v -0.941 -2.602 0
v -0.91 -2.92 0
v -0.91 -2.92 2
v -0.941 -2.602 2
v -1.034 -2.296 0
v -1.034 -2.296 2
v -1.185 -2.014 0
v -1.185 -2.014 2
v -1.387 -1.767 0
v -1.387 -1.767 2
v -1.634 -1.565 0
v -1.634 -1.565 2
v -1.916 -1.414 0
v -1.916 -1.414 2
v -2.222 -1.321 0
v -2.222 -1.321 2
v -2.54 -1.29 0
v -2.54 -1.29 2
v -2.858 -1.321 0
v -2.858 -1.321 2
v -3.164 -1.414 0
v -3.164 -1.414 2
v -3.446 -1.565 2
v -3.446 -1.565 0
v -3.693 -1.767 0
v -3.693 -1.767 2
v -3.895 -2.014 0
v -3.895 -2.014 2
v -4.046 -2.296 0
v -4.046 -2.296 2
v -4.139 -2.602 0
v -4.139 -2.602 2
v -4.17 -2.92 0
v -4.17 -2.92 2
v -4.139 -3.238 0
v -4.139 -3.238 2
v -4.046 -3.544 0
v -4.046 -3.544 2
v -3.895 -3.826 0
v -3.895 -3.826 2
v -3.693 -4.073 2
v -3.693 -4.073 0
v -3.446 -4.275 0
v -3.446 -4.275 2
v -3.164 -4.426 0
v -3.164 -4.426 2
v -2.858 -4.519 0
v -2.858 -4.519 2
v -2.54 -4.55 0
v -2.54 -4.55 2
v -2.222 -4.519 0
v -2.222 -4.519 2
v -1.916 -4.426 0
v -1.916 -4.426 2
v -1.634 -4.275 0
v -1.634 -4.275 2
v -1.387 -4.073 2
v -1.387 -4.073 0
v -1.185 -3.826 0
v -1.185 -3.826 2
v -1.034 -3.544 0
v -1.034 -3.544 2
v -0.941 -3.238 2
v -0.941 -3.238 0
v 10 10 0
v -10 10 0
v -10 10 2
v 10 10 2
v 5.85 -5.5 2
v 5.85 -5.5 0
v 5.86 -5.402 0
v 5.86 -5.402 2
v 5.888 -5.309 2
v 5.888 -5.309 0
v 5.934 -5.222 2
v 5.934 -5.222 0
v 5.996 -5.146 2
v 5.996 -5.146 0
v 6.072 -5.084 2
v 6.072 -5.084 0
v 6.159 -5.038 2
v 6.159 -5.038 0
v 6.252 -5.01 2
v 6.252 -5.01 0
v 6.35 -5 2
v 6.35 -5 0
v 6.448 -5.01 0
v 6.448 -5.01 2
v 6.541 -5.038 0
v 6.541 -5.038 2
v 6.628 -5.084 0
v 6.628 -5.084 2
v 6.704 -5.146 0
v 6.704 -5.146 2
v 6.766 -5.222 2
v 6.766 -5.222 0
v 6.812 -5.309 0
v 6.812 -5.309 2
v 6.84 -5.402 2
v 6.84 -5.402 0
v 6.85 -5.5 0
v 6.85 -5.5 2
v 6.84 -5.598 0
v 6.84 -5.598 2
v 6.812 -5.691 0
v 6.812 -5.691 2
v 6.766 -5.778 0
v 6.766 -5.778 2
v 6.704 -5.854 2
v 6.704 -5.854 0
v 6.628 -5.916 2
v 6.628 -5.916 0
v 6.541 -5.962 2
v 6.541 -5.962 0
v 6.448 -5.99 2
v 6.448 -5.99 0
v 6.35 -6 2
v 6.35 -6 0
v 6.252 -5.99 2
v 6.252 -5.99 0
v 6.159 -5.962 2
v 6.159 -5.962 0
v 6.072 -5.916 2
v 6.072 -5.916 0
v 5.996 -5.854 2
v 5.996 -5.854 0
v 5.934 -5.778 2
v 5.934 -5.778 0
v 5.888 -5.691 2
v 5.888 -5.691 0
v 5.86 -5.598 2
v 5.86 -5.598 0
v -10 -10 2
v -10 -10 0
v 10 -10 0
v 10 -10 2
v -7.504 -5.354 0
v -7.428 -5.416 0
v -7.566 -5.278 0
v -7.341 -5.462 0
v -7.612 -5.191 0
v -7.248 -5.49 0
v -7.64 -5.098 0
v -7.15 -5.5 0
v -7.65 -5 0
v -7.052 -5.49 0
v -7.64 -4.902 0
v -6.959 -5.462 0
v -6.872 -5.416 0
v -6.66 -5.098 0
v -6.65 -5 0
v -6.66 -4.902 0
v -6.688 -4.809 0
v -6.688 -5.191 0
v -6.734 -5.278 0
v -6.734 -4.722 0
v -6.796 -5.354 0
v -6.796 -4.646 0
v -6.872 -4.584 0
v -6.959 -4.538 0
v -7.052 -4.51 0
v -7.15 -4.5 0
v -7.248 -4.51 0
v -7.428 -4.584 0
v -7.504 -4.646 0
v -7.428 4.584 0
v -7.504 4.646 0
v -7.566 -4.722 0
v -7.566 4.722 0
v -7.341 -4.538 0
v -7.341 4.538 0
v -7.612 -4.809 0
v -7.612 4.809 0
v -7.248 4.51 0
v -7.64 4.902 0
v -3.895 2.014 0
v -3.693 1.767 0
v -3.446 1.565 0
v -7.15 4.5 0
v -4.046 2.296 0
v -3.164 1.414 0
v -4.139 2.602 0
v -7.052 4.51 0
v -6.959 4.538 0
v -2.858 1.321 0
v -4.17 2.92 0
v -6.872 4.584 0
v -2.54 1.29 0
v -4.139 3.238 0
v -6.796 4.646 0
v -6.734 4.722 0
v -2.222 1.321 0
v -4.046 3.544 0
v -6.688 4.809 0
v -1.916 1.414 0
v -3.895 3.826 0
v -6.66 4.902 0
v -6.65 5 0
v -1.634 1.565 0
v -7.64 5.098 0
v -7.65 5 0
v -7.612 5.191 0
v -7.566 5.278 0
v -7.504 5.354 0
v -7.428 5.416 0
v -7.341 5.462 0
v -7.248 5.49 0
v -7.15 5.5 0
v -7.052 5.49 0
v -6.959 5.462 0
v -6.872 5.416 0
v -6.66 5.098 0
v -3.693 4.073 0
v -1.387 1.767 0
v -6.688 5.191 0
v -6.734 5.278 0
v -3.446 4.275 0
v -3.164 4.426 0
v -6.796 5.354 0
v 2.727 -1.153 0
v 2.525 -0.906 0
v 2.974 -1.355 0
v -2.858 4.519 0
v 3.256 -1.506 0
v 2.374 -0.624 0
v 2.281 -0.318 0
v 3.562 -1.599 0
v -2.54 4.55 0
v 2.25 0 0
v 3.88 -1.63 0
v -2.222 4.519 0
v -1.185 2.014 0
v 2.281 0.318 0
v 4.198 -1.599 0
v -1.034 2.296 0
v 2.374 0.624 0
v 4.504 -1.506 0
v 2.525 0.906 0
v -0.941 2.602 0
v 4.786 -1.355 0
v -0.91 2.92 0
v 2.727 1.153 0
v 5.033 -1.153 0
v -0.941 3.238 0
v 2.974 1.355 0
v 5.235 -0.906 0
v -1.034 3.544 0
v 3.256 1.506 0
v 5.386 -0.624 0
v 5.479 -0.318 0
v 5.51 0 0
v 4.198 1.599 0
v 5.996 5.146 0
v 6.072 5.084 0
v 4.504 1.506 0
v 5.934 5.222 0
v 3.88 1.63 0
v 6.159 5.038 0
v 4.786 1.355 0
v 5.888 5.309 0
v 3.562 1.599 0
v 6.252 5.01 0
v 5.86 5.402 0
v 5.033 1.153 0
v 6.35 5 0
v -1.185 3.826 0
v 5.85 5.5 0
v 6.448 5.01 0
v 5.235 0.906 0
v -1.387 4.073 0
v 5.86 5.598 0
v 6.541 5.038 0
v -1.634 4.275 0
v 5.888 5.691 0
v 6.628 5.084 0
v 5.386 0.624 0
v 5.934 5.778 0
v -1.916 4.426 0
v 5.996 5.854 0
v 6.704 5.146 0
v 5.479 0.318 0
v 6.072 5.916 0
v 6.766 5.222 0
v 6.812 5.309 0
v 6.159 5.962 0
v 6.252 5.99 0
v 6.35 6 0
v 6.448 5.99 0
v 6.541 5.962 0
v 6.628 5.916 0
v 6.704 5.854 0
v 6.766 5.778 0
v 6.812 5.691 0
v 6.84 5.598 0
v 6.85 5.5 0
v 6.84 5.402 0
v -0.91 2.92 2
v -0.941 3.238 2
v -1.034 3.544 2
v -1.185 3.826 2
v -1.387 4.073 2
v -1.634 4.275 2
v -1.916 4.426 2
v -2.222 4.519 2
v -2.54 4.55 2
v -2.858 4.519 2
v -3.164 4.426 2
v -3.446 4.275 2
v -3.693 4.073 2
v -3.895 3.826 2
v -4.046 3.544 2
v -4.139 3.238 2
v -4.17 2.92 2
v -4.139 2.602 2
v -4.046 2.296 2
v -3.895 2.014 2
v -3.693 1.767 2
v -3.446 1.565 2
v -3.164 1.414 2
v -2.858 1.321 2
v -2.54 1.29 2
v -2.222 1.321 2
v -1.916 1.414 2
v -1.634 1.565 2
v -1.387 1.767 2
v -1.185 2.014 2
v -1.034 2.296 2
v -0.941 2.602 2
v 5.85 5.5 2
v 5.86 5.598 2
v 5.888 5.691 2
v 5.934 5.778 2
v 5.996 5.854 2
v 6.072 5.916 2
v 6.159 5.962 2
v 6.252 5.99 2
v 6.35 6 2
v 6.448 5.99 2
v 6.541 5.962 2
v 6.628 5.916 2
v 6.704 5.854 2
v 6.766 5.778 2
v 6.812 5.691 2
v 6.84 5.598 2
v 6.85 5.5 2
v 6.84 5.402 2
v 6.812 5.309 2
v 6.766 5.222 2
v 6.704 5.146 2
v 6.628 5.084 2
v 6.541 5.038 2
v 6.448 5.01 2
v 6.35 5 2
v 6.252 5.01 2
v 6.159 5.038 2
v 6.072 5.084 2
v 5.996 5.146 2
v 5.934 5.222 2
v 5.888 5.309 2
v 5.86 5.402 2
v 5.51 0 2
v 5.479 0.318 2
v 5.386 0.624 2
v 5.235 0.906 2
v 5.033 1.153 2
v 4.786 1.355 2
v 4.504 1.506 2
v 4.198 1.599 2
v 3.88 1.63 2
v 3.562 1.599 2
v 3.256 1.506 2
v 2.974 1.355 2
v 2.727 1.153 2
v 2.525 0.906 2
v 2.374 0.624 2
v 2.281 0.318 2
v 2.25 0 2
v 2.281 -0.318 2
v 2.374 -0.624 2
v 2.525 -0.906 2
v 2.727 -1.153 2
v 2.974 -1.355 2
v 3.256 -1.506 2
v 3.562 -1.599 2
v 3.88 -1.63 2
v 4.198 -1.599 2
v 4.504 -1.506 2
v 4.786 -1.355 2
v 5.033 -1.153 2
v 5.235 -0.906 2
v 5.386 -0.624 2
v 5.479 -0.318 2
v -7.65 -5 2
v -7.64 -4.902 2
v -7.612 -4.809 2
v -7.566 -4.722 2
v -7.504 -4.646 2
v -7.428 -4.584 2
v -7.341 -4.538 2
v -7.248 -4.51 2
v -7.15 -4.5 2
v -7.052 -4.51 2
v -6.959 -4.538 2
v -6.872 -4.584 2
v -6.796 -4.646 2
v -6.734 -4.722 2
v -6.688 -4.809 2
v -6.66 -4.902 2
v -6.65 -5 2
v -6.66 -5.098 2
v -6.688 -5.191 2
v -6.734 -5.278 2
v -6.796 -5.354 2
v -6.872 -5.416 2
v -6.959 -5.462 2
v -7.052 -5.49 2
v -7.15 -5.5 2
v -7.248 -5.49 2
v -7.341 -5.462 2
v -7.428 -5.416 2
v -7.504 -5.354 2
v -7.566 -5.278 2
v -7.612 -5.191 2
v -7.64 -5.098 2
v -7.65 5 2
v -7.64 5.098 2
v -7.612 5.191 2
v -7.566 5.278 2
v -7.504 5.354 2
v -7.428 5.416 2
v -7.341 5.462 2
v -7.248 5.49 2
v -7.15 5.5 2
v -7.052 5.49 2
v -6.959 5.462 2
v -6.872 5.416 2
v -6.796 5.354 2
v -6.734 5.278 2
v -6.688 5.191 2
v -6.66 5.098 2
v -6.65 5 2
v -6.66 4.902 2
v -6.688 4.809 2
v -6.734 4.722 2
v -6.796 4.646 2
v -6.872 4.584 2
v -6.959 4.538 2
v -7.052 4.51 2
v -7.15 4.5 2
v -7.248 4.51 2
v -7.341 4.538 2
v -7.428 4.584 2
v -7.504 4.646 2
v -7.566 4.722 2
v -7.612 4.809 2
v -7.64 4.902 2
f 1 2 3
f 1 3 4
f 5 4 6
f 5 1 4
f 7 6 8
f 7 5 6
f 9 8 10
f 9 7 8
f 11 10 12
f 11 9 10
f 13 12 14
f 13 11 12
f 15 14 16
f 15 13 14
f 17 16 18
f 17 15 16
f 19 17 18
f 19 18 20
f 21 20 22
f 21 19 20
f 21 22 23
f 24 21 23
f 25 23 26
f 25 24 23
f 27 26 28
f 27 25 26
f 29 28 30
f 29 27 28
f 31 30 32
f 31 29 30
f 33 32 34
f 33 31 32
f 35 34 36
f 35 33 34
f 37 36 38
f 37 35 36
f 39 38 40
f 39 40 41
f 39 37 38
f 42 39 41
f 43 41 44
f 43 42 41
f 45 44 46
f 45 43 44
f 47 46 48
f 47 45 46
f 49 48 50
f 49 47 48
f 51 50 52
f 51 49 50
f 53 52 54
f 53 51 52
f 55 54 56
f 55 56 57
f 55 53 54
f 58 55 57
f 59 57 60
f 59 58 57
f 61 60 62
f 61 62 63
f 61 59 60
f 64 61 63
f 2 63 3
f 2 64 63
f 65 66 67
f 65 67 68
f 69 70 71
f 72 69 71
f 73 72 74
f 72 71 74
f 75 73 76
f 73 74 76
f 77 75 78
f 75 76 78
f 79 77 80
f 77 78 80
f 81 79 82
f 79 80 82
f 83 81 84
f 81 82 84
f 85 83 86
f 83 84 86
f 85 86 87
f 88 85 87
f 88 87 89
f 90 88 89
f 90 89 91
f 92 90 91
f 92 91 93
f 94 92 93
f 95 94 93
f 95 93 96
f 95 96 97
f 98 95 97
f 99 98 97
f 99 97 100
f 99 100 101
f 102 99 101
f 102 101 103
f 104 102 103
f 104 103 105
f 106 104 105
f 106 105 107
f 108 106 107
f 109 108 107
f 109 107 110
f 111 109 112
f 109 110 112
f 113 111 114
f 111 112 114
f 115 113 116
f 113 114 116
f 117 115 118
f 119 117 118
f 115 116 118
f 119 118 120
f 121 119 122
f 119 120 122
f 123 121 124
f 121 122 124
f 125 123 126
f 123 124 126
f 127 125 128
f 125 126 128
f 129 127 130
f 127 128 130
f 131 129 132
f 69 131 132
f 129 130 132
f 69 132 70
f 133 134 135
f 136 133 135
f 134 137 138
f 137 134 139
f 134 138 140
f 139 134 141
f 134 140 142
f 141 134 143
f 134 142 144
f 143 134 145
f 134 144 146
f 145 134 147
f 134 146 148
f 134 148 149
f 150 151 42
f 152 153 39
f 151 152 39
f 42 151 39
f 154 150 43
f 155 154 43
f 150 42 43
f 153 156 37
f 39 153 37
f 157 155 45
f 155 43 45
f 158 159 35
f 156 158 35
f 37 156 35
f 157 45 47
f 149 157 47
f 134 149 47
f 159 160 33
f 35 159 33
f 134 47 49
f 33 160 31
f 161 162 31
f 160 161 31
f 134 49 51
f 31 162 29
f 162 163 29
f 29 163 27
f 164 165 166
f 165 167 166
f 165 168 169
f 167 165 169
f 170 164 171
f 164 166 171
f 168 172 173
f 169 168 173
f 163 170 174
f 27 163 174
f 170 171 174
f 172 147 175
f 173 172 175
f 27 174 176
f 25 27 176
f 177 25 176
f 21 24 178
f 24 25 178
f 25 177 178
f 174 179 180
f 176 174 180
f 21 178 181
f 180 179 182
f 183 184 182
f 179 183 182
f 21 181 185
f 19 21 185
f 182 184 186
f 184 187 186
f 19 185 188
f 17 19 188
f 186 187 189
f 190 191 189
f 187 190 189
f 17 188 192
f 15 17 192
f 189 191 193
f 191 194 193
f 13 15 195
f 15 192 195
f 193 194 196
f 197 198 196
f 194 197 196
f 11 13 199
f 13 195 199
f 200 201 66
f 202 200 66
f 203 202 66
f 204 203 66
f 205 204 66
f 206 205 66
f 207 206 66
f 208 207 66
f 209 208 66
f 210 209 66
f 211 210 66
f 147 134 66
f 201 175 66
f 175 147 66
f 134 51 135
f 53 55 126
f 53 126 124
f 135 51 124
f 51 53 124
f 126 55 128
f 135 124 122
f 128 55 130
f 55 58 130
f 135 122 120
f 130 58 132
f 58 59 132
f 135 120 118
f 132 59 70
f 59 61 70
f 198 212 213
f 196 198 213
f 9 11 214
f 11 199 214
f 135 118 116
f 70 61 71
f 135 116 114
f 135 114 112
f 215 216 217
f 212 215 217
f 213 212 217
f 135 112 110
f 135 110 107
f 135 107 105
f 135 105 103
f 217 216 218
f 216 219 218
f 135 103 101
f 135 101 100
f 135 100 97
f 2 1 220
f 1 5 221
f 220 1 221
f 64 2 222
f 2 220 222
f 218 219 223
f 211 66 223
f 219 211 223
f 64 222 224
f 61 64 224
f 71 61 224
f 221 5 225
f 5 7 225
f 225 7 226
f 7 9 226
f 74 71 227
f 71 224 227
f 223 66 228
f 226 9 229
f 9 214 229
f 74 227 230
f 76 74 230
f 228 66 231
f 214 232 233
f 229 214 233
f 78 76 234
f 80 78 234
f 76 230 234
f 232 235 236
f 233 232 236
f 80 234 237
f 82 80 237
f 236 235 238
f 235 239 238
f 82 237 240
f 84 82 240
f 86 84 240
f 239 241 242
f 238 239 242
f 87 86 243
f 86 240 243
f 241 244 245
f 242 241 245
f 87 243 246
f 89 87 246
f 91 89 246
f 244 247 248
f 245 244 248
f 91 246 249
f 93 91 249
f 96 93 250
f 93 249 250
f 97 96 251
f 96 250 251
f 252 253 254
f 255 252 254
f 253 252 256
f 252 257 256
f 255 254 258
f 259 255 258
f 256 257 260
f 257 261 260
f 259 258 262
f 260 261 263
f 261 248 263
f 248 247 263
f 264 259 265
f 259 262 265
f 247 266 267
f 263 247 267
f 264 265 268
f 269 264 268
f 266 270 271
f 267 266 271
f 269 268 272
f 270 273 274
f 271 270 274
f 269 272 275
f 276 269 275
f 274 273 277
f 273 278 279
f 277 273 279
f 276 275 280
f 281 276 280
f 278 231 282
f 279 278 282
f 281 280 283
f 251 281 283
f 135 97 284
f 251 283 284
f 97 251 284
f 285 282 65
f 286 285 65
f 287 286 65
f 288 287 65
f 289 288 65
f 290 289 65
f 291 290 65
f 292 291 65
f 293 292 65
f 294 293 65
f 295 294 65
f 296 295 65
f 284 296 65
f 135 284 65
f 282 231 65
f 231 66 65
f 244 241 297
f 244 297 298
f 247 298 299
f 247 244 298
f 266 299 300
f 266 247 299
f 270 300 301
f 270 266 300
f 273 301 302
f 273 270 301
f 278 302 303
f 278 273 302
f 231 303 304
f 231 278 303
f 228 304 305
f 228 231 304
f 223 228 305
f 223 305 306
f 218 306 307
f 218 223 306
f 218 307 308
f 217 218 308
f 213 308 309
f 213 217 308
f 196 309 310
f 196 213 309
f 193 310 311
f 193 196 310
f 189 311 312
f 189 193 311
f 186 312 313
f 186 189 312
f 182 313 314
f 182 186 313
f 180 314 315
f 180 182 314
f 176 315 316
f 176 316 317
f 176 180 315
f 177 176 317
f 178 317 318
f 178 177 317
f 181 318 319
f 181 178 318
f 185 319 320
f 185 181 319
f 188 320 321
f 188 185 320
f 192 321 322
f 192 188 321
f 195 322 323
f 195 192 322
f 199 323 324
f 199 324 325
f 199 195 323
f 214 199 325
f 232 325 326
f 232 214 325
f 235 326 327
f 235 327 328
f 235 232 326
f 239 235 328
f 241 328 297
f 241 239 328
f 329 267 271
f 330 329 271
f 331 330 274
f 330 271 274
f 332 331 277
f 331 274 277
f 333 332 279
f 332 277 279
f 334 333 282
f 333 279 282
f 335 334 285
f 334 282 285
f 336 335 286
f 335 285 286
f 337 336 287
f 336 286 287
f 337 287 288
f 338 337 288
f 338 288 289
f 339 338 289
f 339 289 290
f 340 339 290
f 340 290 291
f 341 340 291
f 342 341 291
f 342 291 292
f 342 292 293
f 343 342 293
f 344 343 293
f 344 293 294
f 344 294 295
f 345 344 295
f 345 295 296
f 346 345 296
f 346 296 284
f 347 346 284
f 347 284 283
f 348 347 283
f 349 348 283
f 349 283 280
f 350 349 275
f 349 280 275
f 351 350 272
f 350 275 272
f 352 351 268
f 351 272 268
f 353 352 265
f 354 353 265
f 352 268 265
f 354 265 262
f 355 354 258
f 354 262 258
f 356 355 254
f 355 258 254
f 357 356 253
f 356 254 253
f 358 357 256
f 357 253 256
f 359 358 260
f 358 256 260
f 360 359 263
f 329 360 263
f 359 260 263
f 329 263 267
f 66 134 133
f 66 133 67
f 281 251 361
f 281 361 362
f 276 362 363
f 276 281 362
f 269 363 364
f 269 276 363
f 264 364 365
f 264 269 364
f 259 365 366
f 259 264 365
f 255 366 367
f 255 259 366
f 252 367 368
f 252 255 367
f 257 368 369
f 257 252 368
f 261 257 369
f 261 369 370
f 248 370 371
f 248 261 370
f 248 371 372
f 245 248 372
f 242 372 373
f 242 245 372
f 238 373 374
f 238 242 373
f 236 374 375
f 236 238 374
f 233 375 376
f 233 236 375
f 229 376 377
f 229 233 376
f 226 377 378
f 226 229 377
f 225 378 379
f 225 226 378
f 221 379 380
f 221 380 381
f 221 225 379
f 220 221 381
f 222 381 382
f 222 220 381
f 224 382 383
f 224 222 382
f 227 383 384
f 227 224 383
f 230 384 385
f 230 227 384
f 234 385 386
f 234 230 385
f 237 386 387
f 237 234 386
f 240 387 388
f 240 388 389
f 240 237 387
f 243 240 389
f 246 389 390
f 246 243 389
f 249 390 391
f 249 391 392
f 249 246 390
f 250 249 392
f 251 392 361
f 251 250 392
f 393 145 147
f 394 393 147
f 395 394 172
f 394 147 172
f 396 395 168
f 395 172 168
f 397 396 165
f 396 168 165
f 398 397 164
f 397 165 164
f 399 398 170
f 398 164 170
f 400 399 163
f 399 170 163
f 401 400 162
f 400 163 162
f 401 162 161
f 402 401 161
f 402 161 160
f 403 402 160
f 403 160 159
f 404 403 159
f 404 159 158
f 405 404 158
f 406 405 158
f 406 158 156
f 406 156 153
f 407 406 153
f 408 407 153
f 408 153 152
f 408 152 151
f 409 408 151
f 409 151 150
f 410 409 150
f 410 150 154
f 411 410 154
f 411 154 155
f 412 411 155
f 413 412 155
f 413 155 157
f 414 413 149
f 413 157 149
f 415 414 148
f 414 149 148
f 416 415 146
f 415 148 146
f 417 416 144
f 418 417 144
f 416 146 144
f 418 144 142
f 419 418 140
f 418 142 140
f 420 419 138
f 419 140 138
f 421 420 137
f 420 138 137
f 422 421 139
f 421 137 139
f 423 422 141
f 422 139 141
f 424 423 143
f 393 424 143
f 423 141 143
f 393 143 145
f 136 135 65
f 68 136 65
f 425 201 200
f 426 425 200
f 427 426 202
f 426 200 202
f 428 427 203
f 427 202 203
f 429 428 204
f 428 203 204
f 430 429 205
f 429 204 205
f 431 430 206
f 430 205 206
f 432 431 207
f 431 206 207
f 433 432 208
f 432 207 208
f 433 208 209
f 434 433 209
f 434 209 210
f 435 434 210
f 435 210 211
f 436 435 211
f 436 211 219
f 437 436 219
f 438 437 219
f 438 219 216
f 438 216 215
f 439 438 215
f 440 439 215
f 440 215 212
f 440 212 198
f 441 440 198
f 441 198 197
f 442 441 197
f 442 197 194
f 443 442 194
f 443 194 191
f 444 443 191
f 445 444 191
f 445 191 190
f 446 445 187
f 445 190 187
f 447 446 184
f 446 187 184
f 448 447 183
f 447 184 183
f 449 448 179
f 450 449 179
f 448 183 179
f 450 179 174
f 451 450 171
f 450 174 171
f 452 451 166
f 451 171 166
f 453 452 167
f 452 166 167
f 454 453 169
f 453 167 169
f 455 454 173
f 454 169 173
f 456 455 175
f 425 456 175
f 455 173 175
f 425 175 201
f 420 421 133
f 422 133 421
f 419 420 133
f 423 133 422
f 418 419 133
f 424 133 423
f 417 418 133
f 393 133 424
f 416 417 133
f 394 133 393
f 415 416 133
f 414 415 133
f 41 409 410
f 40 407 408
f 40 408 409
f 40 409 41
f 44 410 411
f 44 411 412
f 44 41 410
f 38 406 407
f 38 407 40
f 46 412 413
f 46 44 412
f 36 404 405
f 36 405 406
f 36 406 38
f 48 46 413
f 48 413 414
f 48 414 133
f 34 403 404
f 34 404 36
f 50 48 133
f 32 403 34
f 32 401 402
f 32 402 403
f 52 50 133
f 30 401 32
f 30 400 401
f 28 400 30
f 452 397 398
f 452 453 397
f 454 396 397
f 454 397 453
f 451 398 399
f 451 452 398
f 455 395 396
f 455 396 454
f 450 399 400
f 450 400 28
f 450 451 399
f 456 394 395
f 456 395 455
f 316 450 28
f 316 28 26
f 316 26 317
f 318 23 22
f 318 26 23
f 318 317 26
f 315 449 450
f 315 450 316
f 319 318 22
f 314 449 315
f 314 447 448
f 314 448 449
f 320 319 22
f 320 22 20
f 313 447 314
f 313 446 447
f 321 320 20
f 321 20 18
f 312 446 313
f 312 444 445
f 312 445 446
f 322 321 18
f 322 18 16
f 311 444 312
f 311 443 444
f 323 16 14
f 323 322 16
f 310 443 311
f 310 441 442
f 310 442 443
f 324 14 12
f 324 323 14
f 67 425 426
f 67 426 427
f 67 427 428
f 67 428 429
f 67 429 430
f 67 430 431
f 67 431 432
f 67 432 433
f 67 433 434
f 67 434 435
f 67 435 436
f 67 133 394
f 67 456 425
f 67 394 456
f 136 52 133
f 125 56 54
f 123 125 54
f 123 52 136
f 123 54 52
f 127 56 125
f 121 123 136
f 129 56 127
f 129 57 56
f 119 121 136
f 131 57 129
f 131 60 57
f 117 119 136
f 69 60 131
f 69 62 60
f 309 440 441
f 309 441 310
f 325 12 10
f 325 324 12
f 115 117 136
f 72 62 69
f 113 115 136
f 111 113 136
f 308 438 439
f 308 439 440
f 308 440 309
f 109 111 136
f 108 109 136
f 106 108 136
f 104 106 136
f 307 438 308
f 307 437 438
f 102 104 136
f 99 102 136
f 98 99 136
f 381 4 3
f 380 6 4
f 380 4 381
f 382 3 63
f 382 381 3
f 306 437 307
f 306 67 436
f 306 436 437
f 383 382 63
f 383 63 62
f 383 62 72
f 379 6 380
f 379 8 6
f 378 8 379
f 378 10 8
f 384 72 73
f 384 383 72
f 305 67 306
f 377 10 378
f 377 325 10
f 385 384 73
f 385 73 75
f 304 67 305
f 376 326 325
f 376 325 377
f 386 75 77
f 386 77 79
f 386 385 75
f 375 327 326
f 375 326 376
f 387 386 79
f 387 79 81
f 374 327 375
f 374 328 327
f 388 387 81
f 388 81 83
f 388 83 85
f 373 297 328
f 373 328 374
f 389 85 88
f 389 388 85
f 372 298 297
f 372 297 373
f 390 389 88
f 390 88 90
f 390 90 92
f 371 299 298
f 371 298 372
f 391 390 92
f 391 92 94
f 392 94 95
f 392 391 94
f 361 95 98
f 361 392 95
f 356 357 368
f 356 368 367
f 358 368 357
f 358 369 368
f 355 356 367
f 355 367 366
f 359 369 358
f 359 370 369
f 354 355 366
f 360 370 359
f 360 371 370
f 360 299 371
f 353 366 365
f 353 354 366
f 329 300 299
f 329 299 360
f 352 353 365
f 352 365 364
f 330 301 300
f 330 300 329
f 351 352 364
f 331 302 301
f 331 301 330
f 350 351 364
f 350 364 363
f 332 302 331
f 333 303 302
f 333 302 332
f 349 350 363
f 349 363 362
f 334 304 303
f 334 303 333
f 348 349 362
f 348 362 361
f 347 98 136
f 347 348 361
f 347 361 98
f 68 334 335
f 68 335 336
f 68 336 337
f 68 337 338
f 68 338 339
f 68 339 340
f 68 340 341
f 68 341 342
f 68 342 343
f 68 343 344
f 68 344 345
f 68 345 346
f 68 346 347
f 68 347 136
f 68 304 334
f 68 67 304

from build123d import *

# Parameters (mm, degrees)
F0_W     = 20
F0_H     = 20
F0_R     = 1.63
F1_DEPTH = 2
F3_D     = 1


with BuildPart() as f1:
    # F0 (on Top) → F1 (new body)
    with BuildSketch(Plane.XY):
        Rectangle(F0_W, F0_H)
        with Locations((-2.54, -2.92)):
            Circle(F0_R, mode=Mode.SUBTRACT)
        with Locations((-2.54, 2.92)):
            Circle(F0_R, mode=Mode.SUBTRACT)
        with Locations((3.88, 0)):
            Circle(F0_R, mode=Mode.SUBTRACT)
    extrude(amount=F1_DEPTH)

    # F3 (through all)
    with Locations(Plane.XY.offset(2)):
        with Locations((6.35, 5.5), (6.35, -5.5), (-7.15, -5), (-7.15, 5)):
            Hole(F3_D / 2)


solid = f1.part
